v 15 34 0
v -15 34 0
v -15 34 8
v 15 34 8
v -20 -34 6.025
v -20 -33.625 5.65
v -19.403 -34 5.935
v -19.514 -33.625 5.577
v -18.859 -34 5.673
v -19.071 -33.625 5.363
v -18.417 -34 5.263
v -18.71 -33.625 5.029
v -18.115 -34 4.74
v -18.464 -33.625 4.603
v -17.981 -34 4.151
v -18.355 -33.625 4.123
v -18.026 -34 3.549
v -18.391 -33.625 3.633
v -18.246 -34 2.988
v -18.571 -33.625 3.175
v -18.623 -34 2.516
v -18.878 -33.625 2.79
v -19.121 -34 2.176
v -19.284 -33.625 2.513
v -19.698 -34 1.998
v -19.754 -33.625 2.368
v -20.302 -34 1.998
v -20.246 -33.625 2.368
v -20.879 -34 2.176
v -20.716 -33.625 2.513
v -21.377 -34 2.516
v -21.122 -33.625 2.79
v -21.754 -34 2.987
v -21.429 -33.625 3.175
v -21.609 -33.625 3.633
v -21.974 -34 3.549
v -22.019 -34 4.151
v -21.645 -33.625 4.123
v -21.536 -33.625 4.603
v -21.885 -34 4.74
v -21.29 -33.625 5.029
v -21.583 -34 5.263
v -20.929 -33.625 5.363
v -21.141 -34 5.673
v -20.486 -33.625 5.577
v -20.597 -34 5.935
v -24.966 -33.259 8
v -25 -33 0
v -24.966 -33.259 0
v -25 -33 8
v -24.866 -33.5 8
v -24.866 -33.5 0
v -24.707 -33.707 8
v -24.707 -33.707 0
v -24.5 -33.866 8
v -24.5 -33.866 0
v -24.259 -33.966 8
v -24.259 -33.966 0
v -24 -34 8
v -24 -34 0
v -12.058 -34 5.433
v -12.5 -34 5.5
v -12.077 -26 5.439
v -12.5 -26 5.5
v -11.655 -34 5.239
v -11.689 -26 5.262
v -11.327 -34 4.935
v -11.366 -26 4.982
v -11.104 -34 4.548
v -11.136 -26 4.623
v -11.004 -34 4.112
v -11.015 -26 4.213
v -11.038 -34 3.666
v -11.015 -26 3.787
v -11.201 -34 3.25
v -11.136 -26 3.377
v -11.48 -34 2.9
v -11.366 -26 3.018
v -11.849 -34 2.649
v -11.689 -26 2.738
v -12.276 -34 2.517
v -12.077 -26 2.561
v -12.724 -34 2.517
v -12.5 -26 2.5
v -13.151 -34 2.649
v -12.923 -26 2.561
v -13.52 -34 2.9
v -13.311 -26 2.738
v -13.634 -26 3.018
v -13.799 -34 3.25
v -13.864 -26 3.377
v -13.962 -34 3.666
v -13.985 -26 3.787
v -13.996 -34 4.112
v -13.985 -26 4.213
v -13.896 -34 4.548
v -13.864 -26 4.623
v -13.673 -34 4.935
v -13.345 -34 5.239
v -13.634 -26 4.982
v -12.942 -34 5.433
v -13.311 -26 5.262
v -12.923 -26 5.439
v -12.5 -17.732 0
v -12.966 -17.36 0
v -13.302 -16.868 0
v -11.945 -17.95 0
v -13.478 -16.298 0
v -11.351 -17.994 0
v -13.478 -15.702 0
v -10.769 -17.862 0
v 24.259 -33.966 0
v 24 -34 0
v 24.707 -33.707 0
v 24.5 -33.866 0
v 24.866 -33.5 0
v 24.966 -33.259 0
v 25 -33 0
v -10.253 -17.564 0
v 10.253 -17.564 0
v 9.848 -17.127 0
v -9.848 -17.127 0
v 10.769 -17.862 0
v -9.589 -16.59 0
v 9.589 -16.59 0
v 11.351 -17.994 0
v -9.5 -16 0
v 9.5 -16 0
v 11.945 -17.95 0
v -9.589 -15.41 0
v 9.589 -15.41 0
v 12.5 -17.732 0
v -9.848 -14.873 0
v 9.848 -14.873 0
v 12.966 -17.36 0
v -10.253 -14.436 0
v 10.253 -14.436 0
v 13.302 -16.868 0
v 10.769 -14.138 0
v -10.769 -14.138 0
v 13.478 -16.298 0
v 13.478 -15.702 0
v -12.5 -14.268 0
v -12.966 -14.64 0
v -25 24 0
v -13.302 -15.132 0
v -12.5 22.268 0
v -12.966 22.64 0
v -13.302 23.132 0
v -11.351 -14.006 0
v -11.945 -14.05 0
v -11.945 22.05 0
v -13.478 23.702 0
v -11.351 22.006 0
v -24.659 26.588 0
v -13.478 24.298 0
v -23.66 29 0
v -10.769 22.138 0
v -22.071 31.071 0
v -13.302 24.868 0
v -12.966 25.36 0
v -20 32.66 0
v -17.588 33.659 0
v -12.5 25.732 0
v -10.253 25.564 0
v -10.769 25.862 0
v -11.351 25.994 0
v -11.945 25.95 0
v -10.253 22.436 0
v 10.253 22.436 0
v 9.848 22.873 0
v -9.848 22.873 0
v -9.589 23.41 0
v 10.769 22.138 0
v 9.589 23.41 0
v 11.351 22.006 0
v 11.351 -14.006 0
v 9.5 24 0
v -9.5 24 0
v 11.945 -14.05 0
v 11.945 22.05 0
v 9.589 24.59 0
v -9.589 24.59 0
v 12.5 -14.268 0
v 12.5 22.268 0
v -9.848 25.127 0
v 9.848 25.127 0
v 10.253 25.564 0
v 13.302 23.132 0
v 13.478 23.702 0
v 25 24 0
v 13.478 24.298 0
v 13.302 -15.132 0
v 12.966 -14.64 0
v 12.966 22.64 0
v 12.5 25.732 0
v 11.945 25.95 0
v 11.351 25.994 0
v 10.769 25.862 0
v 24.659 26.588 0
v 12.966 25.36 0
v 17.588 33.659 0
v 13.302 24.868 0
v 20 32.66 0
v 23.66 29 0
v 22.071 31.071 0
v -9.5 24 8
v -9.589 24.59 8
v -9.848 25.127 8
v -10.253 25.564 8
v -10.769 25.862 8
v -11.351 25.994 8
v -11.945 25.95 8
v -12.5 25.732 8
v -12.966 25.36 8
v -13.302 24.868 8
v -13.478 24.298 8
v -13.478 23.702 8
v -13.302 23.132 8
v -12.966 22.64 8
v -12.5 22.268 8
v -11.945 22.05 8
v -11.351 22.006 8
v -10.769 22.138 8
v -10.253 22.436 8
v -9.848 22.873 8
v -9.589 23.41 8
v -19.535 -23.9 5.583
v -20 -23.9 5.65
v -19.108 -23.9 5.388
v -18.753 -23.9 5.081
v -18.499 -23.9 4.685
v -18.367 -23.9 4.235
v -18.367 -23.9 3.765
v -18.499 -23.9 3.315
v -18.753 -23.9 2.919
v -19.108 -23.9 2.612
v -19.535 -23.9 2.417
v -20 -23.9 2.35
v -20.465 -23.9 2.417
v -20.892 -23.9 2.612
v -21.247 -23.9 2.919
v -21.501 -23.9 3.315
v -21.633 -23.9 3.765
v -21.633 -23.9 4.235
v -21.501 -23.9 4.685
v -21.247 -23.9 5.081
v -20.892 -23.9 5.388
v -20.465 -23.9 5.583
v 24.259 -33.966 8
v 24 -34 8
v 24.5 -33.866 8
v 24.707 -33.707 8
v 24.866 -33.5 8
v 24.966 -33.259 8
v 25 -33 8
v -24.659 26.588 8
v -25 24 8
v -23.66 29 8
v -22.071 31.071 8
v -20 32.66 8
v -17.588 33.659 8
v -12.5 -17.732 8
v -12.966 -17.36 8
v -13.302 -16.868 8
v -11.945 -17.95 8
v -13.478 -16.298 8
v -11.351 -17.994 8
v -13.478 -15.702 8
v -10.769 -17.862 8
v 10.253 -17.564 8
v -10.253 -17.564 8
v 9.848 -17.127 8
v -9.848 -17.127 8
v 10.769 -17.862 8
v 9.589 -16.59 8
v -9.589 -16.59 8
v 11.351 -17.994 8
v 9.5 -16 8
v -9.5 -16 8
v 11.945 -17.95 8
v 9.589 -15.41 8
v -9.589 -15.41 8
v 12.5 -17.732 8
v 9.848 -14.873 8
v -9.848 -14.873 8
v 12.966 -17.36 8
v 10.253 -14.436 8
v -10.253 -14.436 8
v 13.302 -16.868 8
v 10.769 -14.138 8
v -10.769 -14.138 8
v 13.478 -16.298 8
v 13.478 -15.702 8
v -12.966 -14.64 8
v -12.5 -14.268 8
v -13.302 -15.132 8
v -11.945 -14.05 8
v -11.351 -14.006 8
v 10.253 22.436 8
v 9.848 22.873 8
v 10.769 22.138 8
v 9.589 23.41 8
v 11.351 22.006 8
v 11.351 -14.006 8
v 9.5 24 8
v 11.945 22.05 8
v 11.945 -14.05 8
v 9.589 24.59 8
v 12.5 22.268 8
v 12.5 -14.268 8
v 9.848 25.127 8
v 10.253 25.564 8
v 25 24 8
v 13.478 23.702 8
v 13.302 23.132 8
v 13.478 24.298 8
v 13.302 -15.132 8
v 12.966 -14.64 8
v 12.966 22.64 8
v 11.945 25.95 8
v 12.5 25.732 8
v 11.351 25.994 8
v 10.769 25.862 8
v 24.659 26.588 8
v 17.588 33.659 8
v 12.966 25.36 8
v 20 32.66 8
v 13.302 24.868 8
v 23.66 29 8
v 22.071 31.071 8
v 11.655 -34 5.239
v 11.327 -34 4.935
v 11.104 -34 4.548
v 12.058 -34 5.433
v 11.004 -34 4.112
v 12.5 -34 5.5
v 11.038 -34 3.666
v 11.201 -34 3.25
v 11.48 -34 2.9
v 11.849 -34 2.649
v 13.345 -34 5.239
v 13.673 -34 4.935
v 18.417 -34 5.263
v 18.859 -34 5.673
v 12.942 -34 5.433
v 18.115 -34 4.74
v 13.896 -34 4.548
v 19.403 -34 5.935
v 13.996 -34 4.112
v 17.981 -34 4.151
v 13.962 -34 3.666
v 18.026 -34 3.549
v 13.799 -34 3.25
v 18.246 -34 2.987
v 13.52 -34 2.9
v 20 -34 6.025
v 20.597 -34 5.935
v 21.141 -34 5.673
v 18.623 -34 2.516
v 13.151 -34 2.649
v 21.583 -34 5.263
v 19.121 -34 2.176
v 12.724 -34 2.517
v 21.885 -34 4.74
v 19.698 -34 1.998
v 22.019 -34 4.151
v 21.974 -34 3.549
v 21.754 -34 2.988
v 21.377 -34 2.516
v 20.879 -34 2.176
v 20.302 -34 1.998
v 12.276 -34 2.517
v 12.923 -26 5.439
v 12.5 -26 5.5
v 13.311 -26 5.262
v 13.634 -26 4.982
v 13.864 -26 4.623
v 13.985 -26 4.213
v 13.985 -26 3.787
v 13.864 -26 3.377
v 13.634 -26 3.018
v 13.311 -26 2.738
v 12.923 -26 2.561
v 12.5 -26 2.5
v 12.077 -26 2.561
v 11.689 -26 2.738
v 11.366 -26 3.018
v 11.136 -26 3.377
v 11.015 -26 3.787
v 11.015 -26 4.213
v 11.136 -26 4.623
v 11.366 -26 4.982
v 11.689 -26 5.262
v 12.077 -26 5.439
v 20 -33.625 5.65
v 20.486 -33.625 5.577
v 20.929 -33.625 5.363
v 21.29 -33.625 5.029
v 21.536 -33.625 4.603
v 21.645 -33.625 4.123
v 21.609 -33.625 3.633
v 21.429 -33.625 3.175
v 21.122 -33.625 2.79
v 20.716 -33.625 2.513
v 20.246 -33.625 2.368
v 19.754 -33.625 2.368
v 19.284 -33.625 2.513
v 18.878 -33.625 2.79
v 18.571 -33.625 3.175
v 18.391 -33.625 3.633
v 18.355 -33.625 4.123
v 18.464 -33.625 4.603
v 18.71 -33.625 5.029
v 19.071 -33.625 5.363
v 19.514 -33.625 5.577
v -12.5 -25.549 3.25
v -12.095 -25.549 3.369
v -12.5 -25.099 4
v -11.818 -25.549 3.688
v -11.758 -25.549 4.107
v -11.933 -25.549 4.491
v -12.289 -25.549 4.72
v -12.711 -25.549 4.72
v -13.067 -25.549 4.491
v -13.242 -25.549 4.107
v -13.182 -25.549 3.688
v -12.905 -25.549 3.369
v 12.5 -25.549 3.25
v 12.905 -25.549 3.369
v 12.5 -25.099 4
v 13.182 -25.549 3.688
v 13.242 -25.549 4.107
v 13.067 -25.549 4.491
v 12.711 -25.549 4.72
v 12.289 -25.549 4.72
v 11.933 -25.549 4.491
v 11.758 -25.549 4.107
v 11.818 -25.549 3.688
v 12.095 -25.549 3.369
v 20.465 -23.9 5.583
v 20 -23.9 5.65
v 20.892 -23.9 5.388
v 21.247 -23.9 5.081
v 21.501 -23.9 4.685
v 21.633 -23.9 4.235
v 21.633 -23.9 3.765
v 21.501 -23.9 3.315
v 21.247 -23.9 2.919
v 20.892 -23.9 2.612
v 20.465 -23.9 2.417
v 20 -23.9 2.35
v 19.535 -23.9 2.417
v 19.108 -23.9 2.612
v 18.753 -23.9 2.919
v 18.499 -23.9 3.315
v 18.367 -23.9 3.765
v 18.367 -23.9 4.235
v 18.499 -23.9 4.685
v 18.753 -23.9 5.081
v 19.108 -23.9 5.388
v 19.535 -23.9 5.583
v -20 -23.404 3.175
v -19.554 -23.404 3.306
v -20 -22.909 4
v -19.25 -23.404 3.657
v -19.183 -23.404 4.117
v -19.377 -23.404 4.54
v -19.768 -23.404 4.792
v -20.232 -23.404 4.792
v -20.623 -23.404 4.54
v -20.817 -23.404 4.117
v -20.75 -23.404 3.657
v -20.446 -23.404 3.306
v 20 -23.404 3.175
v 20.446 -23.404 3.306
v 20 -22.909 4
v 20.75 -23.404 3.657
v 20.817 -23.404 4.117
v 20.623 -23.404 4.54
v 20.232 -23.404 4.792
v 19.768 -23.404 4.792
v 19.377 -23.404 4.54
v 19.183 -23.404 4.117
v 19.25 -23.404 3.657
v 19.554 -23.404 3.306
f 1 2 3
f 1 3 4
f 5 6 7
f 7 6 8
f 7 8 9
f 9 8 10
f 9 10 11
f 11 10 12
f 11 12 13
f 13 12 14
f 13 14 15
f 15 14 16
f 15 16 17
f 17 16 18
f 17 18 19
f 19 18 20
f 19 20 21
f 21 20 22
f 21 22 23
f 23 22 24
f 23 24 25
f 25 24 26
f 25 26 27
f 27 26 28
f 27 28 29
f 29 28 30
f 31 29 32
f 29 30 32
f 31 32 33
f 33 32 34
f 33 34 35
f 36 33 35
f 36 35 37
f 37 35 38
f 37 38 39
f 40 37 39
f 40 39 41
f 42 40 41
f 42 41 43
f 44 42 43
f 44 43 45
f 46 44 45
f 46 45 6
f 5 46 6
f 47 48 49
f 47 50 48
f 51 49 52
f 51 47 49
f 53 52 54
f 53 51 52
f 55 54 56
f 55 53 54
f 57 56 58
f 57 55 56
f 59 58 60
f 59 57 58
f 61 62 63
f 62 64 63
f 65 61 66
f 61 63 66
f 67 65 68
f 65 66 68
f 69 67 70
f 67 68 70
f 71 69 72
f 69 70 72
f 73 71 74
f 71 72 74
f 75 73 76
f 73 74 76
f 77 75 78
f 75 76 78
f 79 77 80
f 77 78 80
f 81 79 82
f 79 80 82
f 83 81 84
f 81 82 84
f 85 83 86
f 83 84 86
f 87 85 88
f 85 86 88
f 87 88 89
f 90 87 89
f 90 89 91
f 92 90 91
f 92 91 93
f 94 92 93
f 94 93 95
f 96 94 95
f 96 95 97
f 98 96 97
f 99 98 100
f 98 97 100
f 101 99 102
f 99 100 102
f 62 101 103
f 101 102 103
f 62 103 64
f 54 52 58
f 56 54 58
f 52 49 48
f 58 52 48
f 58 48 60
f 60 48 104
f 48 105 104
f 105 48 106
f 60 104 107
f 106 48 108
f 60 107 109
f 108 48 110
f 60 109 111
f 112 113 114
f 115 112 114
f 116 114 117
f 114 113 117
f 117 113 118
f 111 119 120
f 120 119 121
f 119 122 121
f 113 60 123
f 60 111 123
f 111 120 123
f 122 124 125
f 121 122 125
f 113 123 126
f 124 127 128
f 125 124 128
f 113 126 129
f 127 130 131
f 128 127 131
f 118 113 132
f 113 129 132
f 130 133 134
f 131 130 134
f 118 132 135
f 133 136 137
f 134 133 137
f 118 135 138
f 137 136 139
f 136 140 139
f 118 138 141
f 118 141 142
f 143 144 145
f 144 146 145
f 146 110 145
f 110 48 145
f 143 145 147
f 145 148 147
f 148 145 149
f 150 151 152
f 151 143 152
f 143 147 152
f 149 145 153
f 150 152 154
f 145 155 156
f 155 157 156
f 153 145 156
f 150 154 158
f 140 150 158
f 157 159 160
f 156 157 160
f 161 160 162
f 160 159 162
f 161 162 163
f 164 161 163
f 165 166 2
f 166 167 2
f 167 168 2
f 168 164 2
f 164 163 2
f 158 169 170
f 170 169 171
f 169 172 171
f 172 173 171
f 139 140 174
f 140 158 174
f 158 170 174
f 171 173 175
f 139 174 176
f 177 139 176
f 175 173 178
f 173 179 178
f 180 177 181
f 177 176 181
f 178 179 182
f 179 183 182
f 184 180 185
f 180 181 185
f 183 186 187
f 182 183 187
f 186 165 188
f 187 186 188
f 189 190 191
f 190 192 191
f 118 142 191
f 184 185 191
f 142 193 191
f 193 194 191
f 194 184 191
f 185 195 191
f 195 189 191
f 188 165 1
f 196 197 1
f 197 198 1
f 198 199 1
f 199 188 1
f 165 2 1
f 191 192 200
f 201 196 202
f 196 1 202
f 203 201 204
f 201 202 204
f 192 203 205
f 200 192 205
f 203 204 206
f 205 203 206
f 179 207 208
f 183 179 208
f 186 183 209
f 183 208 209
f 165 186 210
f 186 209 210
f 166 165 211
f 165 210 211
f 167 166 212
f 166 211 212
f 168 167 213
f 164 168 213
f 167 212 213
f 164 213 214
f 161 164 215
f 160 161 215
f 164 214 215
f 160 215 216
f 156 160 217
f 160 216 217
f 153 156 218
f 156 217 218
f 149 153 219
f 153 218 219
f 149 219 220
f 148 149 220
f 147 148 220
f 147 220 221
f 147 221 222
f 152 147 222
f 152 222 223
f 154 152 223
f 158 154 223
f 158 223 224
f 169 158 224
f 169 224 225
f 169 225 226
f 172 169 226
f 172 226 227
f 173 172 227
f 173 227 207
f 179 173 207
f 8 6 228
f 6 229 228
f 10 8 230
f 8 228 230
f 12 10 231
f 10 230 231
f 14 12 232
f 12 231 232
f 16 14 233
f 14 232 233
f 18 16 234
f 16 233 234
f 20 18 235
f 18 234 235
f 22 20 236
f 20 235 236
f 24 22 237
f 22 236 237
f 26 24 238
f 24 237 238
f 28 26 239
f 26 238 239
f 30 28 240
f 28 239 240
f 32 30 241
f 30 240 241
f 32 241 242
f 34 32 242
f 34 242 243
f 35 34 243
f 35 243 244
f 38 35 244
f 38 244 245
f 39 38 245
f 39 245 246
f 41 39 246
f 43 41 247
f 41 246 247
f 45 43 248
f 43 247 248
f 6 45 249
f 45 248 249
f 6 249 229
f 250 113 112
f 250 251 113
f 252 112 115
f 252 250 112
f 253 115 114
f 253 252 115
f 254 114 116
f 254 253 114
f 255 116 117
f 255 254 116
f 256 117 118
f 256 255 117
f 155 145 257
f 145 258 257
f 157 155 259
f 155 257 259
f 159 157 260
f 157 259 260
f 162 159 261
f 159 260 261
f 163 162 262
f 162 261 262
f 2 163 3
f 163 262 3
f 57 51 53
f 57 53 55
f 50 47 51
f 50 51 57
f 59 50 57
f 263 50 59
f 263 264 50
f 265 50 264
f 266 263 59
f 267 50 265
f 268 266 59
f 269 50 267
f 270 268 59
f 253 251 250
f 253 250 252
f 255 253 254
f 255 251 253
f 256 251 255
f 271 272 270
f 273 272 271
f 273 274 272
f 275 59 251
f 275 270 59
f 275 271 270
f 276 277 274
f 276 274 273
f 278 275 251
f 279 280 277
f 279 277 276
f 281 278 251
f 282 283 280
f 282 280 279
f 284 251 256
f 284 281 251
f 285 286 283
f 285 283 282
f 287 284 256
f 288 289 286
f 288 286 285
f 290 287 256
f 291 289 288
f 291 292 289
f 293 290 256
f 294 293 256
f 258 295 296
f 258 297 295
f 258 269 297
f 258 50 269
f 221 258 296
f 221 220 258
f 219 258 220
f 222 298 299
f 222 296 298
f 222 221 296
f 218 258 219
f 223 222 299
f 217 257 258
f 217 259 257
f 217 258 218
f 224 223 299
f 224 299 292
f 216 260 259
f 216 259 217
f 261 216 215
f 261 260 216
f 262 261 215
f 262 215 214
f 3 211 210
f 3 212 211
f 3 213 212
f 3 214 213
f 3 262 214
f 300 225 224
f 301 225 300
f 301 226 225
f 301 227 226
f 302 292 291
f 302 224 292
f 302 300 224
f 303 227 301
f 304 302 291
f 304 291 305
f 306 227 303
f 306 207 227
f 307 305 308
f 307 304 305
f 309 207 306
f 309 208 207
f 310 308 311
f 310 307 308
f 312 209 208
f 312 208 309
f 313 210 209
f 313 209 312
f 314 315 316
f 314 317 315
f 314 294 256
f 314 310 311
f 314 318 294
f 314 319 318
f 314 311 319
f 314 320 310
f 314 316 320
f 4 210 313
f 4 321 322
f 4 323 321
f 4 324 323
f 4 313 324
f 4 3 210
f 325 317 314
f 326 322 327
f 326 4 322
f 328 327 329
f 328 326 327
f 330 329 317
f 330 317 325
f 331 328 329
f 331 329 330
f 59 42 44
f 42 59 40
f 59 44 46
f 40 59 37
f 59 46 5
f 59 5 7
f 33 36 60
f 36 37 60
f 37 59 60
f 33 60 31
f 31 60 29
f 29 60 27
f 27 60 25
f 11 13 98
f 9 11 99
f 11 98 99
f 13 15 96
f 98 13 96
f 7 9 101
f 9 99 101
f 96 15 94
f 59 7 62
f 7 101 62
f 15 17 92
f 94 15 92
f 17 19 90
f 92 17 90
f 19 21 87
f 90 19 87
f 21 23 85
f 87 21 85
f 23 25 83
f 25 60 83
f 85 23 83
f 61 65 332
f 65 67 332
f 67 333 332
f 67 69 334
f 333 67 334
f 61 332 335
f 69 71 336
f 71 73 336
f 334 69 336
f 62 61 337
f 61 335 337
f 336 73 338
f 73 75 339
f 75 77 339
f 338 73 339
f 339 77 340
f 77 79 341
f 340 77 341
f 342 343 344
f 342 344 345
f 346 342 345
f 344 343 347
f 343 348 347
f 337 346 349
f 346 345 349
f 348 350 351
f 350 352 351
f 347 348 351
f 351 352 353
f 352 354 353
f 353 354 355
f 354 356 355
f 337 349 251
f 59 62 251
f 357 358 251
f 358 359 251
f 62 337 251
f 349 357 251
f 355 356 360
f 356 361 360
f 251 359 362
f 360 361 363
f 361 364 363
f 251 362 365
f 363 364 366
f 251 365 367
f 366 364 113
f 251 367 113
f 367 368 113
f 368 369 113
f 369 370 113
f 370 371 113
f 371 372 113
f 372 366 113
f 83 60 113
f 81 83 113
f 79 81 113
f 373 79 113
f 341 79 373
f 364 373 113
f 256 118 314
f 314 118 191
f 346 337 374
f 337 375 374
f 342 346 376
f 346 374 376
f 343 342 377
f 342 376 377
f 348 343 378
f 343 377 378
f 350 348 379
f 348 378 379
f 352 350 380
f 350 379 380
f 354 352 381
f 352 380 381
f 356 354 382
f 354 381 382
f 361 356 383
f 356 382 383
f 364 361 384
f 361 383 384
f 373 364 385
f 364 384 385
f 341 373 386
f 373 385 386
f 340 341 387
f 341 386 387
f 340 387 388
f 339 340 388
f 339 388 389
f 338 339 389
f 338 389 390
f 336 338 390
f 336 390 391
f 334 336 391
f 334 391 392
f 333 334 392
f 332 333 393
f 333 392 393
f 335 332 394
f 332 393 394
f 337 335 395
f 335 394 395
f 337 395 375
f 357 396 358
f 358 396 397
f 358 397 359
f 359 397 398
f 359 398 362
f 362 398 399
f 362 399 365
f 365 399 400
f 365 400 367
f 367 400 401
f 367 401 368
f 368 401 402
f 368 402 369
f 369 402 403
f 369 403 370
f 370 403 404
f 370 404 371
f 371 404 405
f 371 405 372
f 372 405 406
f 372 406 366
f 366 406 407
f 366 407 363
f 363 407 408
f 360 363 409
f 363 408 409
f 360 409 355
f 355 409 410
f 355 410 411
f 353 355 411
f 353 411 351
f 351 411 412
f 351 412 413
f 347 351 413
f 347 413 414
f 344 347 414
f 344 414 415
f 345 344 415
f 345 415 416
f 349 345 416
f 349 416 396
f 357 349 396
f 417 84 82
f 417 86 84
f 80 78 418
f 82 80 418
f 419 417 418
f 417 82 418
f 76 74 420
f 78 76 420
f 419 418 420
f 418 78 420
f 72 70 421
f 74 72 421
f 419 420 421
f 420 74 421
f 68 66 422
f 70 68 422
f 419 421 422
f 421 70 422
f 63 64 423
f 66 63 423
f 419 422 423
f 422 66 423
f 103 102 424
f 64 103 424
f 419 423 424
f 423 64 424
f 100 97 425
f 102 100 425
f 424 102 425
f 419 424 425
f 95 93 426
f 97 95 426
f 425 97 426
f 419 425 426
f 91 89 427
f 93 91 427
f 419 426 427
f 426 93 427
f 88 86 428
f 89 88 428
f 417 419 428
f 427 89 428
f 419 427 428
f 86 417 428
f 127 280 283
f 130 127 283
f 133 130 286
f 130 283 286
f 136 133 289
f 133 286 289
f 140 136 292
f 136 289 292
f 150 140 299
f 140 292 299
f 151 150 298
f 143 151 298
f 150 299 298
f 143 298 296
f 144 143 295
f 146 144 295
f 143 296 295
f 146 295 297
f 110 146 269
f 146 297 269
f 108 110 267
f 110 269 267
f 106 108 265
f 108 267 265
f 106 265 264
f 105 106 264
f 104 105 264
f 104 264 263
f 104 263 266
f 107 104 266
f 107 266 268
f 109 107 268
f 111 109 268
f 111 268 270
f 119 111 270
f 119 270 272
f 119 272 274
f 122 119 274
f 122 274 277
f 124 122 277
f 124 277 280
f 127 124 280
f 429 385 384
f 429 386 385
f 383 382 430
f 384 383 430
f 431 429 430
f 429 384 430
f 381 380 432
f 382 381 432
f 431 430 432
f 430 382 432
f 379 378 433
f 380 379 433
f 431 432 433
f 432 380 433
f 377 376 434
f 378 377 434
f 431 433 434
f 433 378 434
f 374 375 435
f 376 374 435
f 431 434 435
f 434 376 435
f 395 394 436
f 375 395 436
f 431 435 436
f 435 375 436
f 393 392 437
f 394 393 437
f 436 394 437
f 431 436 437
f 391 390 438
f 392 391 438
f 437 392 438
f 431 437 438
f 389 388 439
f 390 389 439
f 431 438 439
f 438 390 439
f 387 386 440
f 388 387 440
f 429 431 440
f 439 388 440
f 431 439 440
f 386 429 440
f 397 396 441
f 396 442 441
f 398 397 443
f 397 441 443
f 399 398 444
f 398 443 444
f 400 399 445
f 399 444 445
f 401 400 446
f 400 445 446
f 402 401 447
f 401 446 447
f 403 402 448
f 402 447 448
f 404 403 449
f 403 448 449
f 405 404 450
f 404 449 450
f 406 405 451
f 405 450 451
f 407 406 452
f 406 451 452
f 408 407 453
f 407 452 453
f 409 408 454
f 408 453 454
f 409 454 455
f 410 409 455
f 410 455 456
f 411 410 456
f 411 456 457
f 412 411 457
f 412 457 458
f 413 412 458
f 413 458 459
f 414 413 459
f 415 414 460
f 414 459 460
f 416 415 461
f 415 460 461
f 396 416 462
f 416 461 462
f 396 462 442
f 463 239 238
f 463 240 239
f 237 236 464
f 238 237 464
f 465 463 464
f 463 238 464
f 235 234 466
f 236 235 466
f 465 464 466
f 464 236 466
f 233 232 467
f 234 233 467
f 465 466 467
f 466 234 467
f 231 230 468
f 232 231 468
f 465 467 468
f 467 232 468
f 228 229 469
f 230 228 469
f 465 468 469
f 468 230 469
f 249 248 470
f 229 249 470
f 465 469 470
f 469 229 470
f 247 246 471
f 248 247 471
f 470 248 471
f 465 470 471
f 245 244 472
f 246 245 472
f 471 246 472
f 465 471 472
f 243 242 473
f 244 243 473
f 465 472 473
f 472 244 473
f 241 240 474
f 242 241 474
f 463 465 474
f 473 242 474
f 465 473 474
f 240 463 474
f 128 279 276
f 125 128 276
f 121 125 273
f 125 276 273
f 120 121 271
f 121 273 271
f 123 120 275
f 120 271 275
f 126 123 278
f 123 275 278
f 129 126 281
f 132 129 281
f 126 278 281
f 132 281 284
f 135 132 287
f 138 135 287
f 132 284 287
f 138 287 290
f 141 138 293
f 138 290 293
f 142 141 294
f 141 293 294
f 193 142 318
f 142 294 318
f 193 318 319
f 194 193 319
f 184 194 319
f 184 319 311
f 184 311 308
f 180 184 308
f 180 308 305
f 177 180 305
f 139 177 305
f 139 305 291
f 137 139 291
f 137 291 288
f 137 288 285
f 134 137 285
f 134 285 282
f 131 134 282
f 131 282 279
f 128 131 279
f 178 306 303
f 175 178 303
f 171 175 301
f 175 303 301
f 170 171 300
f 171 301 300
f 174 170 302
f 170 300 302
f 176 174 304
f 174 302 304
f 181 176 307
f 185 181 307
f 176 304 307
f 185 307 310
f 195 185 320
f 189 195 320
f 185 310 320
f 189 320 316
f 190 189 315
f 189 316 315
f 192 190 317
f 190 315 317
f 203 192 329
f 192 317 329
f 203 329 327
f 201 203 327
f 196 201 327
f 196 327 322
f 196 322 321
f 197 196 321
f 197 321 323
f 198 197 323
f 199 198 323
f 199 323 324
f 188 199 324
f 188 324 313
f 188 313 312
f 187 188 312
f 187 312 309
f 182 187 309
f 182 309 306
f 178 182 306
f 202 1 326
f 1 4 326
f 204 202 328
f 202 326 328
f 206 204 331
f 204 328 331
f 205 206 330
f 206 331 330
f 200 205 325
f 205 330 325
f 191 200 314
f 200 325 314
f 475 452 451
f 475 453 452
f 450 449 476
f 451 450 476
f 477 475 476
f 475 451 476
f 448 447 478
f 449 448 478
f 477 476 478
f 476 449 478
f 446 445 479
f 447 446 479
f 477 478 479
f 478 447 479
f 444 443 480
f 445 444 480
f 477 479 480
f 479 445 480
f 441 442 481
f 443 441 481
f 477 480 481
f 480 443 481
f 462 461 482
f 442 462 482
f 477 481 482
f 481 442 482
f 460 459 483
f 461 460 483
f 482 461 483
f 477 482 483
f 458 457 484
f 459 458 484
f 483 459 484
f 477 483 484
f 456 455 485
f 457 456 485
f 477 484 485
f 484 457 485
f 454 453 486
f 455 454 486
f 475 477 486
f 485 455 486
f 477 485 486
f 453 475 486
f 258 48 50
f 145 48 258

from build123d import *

# Parameters (mm, degrees)
SKETCH_1_W                   = 50
SKETCH_1_H                   = 68
EXTRUDE_1_DEPTH              = 8
SKETCH_2_R                   = 2
CUT_EXTRUDE_1_DEPTH          = 43.95346319
HOLE_WIZARD_M4_1_D           = 3.3
HOLE_WIZARD_M4_1_DEPTH       = 10.1
HOLE_WIZARD_M4_1_CSINK_D     = 4.05
HOLE_WIZARD_M4_1_CSINK_ANGLE = 90
HOLE_WIZARD_M4_1_TIP         = 0.991420021
MM_1_D                       = 3
MM_1_DEPTH                   = 8
MM_1_TIP                     = 0.901290929
FILLET_1_R                   = 10
FILLET_2_R                   = 1


with BuildPart() as part:
    # 草图1 → 凸台-拉伸1 (new body)
    with BuildSketch(Plane.XY):
        Rectangle(SKETCH_1_W, SKETCH_1_H)
    extrude(amount=EXTRUDE_1_DEPTH)

    # 草图2 → 切除-拉伸1 (cut, through all)
    with BuildSketch(Plane.XY.offset(8)):
        with Locations((-11.5, -16)):
            Circle(SKETCH_2_R)
        with Locations((-11.5, 24)):
            Circle(SKETCH_2_R)
        with Locations(Location((11.5, 24, 0), (0, 0, 180))):
            Circle(SKETCH_2_R)
        with Locations(Location((11.5, -16, 0), (0, 0, 180))):
            Circle(SKETCH_2_R)
    extrude(amount=-CUT_EXTRUDE_1_DEPTH, mode=Mode.SUBTRACT)

    # M4 螺纹孔1
    with Locations(Plane(origin=(-20, -34, 4), x_dir=(0, 0, -1), z_dir=(0, -1, 0))):
        with Locations((0, 0), (0, 40)):
            CounterSinkHole(HOLE_WIZARD_M4_1_D / 2, HOLE_WIZARD_M4_1_CSINK_D / 2, depth=HOLE_WIZARD_M4_1_DEPTH, counter_sink_angle=HOLE_WIZARD_M4_1_CSINK_ANGLE)
            with Locations((0, 0, -(HOLE_WIZARD_M4_1_DEPTH + HOLE_WIZARD_M4_1_TIP / 2))):  # 118° drill point
                Cone(0, HOLE_WIZARD_M4_1_D / 2, HOLE_WIZARD_M4_1_TIP, mode=Mode.SUBTRACT)

    # 大小mm 暗销孔1
    with Locations(Plane(origin=(-12.5, -34, 4), x_dir=(0, 0, -1), z_dir=(0, -1, 0))):
        with Locations((0, 0), (0, 25)):
            Hole(MM_1_D / 2, depth=MM_1_DEPTH)
            with Locations((0, 0, -(MM_1_DEPTH + MM_1_TIP / 2))):  # 118° drill point
                Cone(0, MM_1_D / 2, MM_1_TIP, mode=Mode.SUBTRACT)

    # 圆角1
    fillet_1_edges = [part.edges().sort_by_distance(p)[0] for p in [
        (-25, 34, 4),
        (25, 34, 4),
    ]]
    fillet(fillet_1_edges, radius=FILLET_1_R)

    # 圆角2
    fillet_2_edges = [part.edges().sort_by_distance(p)[0] for p in [
        (25, -34, 4),
        (-25, -34, 4),
    ]]
    fillet(fillet_2_edges, radius=FILLET_2_R)


solid = part.part
